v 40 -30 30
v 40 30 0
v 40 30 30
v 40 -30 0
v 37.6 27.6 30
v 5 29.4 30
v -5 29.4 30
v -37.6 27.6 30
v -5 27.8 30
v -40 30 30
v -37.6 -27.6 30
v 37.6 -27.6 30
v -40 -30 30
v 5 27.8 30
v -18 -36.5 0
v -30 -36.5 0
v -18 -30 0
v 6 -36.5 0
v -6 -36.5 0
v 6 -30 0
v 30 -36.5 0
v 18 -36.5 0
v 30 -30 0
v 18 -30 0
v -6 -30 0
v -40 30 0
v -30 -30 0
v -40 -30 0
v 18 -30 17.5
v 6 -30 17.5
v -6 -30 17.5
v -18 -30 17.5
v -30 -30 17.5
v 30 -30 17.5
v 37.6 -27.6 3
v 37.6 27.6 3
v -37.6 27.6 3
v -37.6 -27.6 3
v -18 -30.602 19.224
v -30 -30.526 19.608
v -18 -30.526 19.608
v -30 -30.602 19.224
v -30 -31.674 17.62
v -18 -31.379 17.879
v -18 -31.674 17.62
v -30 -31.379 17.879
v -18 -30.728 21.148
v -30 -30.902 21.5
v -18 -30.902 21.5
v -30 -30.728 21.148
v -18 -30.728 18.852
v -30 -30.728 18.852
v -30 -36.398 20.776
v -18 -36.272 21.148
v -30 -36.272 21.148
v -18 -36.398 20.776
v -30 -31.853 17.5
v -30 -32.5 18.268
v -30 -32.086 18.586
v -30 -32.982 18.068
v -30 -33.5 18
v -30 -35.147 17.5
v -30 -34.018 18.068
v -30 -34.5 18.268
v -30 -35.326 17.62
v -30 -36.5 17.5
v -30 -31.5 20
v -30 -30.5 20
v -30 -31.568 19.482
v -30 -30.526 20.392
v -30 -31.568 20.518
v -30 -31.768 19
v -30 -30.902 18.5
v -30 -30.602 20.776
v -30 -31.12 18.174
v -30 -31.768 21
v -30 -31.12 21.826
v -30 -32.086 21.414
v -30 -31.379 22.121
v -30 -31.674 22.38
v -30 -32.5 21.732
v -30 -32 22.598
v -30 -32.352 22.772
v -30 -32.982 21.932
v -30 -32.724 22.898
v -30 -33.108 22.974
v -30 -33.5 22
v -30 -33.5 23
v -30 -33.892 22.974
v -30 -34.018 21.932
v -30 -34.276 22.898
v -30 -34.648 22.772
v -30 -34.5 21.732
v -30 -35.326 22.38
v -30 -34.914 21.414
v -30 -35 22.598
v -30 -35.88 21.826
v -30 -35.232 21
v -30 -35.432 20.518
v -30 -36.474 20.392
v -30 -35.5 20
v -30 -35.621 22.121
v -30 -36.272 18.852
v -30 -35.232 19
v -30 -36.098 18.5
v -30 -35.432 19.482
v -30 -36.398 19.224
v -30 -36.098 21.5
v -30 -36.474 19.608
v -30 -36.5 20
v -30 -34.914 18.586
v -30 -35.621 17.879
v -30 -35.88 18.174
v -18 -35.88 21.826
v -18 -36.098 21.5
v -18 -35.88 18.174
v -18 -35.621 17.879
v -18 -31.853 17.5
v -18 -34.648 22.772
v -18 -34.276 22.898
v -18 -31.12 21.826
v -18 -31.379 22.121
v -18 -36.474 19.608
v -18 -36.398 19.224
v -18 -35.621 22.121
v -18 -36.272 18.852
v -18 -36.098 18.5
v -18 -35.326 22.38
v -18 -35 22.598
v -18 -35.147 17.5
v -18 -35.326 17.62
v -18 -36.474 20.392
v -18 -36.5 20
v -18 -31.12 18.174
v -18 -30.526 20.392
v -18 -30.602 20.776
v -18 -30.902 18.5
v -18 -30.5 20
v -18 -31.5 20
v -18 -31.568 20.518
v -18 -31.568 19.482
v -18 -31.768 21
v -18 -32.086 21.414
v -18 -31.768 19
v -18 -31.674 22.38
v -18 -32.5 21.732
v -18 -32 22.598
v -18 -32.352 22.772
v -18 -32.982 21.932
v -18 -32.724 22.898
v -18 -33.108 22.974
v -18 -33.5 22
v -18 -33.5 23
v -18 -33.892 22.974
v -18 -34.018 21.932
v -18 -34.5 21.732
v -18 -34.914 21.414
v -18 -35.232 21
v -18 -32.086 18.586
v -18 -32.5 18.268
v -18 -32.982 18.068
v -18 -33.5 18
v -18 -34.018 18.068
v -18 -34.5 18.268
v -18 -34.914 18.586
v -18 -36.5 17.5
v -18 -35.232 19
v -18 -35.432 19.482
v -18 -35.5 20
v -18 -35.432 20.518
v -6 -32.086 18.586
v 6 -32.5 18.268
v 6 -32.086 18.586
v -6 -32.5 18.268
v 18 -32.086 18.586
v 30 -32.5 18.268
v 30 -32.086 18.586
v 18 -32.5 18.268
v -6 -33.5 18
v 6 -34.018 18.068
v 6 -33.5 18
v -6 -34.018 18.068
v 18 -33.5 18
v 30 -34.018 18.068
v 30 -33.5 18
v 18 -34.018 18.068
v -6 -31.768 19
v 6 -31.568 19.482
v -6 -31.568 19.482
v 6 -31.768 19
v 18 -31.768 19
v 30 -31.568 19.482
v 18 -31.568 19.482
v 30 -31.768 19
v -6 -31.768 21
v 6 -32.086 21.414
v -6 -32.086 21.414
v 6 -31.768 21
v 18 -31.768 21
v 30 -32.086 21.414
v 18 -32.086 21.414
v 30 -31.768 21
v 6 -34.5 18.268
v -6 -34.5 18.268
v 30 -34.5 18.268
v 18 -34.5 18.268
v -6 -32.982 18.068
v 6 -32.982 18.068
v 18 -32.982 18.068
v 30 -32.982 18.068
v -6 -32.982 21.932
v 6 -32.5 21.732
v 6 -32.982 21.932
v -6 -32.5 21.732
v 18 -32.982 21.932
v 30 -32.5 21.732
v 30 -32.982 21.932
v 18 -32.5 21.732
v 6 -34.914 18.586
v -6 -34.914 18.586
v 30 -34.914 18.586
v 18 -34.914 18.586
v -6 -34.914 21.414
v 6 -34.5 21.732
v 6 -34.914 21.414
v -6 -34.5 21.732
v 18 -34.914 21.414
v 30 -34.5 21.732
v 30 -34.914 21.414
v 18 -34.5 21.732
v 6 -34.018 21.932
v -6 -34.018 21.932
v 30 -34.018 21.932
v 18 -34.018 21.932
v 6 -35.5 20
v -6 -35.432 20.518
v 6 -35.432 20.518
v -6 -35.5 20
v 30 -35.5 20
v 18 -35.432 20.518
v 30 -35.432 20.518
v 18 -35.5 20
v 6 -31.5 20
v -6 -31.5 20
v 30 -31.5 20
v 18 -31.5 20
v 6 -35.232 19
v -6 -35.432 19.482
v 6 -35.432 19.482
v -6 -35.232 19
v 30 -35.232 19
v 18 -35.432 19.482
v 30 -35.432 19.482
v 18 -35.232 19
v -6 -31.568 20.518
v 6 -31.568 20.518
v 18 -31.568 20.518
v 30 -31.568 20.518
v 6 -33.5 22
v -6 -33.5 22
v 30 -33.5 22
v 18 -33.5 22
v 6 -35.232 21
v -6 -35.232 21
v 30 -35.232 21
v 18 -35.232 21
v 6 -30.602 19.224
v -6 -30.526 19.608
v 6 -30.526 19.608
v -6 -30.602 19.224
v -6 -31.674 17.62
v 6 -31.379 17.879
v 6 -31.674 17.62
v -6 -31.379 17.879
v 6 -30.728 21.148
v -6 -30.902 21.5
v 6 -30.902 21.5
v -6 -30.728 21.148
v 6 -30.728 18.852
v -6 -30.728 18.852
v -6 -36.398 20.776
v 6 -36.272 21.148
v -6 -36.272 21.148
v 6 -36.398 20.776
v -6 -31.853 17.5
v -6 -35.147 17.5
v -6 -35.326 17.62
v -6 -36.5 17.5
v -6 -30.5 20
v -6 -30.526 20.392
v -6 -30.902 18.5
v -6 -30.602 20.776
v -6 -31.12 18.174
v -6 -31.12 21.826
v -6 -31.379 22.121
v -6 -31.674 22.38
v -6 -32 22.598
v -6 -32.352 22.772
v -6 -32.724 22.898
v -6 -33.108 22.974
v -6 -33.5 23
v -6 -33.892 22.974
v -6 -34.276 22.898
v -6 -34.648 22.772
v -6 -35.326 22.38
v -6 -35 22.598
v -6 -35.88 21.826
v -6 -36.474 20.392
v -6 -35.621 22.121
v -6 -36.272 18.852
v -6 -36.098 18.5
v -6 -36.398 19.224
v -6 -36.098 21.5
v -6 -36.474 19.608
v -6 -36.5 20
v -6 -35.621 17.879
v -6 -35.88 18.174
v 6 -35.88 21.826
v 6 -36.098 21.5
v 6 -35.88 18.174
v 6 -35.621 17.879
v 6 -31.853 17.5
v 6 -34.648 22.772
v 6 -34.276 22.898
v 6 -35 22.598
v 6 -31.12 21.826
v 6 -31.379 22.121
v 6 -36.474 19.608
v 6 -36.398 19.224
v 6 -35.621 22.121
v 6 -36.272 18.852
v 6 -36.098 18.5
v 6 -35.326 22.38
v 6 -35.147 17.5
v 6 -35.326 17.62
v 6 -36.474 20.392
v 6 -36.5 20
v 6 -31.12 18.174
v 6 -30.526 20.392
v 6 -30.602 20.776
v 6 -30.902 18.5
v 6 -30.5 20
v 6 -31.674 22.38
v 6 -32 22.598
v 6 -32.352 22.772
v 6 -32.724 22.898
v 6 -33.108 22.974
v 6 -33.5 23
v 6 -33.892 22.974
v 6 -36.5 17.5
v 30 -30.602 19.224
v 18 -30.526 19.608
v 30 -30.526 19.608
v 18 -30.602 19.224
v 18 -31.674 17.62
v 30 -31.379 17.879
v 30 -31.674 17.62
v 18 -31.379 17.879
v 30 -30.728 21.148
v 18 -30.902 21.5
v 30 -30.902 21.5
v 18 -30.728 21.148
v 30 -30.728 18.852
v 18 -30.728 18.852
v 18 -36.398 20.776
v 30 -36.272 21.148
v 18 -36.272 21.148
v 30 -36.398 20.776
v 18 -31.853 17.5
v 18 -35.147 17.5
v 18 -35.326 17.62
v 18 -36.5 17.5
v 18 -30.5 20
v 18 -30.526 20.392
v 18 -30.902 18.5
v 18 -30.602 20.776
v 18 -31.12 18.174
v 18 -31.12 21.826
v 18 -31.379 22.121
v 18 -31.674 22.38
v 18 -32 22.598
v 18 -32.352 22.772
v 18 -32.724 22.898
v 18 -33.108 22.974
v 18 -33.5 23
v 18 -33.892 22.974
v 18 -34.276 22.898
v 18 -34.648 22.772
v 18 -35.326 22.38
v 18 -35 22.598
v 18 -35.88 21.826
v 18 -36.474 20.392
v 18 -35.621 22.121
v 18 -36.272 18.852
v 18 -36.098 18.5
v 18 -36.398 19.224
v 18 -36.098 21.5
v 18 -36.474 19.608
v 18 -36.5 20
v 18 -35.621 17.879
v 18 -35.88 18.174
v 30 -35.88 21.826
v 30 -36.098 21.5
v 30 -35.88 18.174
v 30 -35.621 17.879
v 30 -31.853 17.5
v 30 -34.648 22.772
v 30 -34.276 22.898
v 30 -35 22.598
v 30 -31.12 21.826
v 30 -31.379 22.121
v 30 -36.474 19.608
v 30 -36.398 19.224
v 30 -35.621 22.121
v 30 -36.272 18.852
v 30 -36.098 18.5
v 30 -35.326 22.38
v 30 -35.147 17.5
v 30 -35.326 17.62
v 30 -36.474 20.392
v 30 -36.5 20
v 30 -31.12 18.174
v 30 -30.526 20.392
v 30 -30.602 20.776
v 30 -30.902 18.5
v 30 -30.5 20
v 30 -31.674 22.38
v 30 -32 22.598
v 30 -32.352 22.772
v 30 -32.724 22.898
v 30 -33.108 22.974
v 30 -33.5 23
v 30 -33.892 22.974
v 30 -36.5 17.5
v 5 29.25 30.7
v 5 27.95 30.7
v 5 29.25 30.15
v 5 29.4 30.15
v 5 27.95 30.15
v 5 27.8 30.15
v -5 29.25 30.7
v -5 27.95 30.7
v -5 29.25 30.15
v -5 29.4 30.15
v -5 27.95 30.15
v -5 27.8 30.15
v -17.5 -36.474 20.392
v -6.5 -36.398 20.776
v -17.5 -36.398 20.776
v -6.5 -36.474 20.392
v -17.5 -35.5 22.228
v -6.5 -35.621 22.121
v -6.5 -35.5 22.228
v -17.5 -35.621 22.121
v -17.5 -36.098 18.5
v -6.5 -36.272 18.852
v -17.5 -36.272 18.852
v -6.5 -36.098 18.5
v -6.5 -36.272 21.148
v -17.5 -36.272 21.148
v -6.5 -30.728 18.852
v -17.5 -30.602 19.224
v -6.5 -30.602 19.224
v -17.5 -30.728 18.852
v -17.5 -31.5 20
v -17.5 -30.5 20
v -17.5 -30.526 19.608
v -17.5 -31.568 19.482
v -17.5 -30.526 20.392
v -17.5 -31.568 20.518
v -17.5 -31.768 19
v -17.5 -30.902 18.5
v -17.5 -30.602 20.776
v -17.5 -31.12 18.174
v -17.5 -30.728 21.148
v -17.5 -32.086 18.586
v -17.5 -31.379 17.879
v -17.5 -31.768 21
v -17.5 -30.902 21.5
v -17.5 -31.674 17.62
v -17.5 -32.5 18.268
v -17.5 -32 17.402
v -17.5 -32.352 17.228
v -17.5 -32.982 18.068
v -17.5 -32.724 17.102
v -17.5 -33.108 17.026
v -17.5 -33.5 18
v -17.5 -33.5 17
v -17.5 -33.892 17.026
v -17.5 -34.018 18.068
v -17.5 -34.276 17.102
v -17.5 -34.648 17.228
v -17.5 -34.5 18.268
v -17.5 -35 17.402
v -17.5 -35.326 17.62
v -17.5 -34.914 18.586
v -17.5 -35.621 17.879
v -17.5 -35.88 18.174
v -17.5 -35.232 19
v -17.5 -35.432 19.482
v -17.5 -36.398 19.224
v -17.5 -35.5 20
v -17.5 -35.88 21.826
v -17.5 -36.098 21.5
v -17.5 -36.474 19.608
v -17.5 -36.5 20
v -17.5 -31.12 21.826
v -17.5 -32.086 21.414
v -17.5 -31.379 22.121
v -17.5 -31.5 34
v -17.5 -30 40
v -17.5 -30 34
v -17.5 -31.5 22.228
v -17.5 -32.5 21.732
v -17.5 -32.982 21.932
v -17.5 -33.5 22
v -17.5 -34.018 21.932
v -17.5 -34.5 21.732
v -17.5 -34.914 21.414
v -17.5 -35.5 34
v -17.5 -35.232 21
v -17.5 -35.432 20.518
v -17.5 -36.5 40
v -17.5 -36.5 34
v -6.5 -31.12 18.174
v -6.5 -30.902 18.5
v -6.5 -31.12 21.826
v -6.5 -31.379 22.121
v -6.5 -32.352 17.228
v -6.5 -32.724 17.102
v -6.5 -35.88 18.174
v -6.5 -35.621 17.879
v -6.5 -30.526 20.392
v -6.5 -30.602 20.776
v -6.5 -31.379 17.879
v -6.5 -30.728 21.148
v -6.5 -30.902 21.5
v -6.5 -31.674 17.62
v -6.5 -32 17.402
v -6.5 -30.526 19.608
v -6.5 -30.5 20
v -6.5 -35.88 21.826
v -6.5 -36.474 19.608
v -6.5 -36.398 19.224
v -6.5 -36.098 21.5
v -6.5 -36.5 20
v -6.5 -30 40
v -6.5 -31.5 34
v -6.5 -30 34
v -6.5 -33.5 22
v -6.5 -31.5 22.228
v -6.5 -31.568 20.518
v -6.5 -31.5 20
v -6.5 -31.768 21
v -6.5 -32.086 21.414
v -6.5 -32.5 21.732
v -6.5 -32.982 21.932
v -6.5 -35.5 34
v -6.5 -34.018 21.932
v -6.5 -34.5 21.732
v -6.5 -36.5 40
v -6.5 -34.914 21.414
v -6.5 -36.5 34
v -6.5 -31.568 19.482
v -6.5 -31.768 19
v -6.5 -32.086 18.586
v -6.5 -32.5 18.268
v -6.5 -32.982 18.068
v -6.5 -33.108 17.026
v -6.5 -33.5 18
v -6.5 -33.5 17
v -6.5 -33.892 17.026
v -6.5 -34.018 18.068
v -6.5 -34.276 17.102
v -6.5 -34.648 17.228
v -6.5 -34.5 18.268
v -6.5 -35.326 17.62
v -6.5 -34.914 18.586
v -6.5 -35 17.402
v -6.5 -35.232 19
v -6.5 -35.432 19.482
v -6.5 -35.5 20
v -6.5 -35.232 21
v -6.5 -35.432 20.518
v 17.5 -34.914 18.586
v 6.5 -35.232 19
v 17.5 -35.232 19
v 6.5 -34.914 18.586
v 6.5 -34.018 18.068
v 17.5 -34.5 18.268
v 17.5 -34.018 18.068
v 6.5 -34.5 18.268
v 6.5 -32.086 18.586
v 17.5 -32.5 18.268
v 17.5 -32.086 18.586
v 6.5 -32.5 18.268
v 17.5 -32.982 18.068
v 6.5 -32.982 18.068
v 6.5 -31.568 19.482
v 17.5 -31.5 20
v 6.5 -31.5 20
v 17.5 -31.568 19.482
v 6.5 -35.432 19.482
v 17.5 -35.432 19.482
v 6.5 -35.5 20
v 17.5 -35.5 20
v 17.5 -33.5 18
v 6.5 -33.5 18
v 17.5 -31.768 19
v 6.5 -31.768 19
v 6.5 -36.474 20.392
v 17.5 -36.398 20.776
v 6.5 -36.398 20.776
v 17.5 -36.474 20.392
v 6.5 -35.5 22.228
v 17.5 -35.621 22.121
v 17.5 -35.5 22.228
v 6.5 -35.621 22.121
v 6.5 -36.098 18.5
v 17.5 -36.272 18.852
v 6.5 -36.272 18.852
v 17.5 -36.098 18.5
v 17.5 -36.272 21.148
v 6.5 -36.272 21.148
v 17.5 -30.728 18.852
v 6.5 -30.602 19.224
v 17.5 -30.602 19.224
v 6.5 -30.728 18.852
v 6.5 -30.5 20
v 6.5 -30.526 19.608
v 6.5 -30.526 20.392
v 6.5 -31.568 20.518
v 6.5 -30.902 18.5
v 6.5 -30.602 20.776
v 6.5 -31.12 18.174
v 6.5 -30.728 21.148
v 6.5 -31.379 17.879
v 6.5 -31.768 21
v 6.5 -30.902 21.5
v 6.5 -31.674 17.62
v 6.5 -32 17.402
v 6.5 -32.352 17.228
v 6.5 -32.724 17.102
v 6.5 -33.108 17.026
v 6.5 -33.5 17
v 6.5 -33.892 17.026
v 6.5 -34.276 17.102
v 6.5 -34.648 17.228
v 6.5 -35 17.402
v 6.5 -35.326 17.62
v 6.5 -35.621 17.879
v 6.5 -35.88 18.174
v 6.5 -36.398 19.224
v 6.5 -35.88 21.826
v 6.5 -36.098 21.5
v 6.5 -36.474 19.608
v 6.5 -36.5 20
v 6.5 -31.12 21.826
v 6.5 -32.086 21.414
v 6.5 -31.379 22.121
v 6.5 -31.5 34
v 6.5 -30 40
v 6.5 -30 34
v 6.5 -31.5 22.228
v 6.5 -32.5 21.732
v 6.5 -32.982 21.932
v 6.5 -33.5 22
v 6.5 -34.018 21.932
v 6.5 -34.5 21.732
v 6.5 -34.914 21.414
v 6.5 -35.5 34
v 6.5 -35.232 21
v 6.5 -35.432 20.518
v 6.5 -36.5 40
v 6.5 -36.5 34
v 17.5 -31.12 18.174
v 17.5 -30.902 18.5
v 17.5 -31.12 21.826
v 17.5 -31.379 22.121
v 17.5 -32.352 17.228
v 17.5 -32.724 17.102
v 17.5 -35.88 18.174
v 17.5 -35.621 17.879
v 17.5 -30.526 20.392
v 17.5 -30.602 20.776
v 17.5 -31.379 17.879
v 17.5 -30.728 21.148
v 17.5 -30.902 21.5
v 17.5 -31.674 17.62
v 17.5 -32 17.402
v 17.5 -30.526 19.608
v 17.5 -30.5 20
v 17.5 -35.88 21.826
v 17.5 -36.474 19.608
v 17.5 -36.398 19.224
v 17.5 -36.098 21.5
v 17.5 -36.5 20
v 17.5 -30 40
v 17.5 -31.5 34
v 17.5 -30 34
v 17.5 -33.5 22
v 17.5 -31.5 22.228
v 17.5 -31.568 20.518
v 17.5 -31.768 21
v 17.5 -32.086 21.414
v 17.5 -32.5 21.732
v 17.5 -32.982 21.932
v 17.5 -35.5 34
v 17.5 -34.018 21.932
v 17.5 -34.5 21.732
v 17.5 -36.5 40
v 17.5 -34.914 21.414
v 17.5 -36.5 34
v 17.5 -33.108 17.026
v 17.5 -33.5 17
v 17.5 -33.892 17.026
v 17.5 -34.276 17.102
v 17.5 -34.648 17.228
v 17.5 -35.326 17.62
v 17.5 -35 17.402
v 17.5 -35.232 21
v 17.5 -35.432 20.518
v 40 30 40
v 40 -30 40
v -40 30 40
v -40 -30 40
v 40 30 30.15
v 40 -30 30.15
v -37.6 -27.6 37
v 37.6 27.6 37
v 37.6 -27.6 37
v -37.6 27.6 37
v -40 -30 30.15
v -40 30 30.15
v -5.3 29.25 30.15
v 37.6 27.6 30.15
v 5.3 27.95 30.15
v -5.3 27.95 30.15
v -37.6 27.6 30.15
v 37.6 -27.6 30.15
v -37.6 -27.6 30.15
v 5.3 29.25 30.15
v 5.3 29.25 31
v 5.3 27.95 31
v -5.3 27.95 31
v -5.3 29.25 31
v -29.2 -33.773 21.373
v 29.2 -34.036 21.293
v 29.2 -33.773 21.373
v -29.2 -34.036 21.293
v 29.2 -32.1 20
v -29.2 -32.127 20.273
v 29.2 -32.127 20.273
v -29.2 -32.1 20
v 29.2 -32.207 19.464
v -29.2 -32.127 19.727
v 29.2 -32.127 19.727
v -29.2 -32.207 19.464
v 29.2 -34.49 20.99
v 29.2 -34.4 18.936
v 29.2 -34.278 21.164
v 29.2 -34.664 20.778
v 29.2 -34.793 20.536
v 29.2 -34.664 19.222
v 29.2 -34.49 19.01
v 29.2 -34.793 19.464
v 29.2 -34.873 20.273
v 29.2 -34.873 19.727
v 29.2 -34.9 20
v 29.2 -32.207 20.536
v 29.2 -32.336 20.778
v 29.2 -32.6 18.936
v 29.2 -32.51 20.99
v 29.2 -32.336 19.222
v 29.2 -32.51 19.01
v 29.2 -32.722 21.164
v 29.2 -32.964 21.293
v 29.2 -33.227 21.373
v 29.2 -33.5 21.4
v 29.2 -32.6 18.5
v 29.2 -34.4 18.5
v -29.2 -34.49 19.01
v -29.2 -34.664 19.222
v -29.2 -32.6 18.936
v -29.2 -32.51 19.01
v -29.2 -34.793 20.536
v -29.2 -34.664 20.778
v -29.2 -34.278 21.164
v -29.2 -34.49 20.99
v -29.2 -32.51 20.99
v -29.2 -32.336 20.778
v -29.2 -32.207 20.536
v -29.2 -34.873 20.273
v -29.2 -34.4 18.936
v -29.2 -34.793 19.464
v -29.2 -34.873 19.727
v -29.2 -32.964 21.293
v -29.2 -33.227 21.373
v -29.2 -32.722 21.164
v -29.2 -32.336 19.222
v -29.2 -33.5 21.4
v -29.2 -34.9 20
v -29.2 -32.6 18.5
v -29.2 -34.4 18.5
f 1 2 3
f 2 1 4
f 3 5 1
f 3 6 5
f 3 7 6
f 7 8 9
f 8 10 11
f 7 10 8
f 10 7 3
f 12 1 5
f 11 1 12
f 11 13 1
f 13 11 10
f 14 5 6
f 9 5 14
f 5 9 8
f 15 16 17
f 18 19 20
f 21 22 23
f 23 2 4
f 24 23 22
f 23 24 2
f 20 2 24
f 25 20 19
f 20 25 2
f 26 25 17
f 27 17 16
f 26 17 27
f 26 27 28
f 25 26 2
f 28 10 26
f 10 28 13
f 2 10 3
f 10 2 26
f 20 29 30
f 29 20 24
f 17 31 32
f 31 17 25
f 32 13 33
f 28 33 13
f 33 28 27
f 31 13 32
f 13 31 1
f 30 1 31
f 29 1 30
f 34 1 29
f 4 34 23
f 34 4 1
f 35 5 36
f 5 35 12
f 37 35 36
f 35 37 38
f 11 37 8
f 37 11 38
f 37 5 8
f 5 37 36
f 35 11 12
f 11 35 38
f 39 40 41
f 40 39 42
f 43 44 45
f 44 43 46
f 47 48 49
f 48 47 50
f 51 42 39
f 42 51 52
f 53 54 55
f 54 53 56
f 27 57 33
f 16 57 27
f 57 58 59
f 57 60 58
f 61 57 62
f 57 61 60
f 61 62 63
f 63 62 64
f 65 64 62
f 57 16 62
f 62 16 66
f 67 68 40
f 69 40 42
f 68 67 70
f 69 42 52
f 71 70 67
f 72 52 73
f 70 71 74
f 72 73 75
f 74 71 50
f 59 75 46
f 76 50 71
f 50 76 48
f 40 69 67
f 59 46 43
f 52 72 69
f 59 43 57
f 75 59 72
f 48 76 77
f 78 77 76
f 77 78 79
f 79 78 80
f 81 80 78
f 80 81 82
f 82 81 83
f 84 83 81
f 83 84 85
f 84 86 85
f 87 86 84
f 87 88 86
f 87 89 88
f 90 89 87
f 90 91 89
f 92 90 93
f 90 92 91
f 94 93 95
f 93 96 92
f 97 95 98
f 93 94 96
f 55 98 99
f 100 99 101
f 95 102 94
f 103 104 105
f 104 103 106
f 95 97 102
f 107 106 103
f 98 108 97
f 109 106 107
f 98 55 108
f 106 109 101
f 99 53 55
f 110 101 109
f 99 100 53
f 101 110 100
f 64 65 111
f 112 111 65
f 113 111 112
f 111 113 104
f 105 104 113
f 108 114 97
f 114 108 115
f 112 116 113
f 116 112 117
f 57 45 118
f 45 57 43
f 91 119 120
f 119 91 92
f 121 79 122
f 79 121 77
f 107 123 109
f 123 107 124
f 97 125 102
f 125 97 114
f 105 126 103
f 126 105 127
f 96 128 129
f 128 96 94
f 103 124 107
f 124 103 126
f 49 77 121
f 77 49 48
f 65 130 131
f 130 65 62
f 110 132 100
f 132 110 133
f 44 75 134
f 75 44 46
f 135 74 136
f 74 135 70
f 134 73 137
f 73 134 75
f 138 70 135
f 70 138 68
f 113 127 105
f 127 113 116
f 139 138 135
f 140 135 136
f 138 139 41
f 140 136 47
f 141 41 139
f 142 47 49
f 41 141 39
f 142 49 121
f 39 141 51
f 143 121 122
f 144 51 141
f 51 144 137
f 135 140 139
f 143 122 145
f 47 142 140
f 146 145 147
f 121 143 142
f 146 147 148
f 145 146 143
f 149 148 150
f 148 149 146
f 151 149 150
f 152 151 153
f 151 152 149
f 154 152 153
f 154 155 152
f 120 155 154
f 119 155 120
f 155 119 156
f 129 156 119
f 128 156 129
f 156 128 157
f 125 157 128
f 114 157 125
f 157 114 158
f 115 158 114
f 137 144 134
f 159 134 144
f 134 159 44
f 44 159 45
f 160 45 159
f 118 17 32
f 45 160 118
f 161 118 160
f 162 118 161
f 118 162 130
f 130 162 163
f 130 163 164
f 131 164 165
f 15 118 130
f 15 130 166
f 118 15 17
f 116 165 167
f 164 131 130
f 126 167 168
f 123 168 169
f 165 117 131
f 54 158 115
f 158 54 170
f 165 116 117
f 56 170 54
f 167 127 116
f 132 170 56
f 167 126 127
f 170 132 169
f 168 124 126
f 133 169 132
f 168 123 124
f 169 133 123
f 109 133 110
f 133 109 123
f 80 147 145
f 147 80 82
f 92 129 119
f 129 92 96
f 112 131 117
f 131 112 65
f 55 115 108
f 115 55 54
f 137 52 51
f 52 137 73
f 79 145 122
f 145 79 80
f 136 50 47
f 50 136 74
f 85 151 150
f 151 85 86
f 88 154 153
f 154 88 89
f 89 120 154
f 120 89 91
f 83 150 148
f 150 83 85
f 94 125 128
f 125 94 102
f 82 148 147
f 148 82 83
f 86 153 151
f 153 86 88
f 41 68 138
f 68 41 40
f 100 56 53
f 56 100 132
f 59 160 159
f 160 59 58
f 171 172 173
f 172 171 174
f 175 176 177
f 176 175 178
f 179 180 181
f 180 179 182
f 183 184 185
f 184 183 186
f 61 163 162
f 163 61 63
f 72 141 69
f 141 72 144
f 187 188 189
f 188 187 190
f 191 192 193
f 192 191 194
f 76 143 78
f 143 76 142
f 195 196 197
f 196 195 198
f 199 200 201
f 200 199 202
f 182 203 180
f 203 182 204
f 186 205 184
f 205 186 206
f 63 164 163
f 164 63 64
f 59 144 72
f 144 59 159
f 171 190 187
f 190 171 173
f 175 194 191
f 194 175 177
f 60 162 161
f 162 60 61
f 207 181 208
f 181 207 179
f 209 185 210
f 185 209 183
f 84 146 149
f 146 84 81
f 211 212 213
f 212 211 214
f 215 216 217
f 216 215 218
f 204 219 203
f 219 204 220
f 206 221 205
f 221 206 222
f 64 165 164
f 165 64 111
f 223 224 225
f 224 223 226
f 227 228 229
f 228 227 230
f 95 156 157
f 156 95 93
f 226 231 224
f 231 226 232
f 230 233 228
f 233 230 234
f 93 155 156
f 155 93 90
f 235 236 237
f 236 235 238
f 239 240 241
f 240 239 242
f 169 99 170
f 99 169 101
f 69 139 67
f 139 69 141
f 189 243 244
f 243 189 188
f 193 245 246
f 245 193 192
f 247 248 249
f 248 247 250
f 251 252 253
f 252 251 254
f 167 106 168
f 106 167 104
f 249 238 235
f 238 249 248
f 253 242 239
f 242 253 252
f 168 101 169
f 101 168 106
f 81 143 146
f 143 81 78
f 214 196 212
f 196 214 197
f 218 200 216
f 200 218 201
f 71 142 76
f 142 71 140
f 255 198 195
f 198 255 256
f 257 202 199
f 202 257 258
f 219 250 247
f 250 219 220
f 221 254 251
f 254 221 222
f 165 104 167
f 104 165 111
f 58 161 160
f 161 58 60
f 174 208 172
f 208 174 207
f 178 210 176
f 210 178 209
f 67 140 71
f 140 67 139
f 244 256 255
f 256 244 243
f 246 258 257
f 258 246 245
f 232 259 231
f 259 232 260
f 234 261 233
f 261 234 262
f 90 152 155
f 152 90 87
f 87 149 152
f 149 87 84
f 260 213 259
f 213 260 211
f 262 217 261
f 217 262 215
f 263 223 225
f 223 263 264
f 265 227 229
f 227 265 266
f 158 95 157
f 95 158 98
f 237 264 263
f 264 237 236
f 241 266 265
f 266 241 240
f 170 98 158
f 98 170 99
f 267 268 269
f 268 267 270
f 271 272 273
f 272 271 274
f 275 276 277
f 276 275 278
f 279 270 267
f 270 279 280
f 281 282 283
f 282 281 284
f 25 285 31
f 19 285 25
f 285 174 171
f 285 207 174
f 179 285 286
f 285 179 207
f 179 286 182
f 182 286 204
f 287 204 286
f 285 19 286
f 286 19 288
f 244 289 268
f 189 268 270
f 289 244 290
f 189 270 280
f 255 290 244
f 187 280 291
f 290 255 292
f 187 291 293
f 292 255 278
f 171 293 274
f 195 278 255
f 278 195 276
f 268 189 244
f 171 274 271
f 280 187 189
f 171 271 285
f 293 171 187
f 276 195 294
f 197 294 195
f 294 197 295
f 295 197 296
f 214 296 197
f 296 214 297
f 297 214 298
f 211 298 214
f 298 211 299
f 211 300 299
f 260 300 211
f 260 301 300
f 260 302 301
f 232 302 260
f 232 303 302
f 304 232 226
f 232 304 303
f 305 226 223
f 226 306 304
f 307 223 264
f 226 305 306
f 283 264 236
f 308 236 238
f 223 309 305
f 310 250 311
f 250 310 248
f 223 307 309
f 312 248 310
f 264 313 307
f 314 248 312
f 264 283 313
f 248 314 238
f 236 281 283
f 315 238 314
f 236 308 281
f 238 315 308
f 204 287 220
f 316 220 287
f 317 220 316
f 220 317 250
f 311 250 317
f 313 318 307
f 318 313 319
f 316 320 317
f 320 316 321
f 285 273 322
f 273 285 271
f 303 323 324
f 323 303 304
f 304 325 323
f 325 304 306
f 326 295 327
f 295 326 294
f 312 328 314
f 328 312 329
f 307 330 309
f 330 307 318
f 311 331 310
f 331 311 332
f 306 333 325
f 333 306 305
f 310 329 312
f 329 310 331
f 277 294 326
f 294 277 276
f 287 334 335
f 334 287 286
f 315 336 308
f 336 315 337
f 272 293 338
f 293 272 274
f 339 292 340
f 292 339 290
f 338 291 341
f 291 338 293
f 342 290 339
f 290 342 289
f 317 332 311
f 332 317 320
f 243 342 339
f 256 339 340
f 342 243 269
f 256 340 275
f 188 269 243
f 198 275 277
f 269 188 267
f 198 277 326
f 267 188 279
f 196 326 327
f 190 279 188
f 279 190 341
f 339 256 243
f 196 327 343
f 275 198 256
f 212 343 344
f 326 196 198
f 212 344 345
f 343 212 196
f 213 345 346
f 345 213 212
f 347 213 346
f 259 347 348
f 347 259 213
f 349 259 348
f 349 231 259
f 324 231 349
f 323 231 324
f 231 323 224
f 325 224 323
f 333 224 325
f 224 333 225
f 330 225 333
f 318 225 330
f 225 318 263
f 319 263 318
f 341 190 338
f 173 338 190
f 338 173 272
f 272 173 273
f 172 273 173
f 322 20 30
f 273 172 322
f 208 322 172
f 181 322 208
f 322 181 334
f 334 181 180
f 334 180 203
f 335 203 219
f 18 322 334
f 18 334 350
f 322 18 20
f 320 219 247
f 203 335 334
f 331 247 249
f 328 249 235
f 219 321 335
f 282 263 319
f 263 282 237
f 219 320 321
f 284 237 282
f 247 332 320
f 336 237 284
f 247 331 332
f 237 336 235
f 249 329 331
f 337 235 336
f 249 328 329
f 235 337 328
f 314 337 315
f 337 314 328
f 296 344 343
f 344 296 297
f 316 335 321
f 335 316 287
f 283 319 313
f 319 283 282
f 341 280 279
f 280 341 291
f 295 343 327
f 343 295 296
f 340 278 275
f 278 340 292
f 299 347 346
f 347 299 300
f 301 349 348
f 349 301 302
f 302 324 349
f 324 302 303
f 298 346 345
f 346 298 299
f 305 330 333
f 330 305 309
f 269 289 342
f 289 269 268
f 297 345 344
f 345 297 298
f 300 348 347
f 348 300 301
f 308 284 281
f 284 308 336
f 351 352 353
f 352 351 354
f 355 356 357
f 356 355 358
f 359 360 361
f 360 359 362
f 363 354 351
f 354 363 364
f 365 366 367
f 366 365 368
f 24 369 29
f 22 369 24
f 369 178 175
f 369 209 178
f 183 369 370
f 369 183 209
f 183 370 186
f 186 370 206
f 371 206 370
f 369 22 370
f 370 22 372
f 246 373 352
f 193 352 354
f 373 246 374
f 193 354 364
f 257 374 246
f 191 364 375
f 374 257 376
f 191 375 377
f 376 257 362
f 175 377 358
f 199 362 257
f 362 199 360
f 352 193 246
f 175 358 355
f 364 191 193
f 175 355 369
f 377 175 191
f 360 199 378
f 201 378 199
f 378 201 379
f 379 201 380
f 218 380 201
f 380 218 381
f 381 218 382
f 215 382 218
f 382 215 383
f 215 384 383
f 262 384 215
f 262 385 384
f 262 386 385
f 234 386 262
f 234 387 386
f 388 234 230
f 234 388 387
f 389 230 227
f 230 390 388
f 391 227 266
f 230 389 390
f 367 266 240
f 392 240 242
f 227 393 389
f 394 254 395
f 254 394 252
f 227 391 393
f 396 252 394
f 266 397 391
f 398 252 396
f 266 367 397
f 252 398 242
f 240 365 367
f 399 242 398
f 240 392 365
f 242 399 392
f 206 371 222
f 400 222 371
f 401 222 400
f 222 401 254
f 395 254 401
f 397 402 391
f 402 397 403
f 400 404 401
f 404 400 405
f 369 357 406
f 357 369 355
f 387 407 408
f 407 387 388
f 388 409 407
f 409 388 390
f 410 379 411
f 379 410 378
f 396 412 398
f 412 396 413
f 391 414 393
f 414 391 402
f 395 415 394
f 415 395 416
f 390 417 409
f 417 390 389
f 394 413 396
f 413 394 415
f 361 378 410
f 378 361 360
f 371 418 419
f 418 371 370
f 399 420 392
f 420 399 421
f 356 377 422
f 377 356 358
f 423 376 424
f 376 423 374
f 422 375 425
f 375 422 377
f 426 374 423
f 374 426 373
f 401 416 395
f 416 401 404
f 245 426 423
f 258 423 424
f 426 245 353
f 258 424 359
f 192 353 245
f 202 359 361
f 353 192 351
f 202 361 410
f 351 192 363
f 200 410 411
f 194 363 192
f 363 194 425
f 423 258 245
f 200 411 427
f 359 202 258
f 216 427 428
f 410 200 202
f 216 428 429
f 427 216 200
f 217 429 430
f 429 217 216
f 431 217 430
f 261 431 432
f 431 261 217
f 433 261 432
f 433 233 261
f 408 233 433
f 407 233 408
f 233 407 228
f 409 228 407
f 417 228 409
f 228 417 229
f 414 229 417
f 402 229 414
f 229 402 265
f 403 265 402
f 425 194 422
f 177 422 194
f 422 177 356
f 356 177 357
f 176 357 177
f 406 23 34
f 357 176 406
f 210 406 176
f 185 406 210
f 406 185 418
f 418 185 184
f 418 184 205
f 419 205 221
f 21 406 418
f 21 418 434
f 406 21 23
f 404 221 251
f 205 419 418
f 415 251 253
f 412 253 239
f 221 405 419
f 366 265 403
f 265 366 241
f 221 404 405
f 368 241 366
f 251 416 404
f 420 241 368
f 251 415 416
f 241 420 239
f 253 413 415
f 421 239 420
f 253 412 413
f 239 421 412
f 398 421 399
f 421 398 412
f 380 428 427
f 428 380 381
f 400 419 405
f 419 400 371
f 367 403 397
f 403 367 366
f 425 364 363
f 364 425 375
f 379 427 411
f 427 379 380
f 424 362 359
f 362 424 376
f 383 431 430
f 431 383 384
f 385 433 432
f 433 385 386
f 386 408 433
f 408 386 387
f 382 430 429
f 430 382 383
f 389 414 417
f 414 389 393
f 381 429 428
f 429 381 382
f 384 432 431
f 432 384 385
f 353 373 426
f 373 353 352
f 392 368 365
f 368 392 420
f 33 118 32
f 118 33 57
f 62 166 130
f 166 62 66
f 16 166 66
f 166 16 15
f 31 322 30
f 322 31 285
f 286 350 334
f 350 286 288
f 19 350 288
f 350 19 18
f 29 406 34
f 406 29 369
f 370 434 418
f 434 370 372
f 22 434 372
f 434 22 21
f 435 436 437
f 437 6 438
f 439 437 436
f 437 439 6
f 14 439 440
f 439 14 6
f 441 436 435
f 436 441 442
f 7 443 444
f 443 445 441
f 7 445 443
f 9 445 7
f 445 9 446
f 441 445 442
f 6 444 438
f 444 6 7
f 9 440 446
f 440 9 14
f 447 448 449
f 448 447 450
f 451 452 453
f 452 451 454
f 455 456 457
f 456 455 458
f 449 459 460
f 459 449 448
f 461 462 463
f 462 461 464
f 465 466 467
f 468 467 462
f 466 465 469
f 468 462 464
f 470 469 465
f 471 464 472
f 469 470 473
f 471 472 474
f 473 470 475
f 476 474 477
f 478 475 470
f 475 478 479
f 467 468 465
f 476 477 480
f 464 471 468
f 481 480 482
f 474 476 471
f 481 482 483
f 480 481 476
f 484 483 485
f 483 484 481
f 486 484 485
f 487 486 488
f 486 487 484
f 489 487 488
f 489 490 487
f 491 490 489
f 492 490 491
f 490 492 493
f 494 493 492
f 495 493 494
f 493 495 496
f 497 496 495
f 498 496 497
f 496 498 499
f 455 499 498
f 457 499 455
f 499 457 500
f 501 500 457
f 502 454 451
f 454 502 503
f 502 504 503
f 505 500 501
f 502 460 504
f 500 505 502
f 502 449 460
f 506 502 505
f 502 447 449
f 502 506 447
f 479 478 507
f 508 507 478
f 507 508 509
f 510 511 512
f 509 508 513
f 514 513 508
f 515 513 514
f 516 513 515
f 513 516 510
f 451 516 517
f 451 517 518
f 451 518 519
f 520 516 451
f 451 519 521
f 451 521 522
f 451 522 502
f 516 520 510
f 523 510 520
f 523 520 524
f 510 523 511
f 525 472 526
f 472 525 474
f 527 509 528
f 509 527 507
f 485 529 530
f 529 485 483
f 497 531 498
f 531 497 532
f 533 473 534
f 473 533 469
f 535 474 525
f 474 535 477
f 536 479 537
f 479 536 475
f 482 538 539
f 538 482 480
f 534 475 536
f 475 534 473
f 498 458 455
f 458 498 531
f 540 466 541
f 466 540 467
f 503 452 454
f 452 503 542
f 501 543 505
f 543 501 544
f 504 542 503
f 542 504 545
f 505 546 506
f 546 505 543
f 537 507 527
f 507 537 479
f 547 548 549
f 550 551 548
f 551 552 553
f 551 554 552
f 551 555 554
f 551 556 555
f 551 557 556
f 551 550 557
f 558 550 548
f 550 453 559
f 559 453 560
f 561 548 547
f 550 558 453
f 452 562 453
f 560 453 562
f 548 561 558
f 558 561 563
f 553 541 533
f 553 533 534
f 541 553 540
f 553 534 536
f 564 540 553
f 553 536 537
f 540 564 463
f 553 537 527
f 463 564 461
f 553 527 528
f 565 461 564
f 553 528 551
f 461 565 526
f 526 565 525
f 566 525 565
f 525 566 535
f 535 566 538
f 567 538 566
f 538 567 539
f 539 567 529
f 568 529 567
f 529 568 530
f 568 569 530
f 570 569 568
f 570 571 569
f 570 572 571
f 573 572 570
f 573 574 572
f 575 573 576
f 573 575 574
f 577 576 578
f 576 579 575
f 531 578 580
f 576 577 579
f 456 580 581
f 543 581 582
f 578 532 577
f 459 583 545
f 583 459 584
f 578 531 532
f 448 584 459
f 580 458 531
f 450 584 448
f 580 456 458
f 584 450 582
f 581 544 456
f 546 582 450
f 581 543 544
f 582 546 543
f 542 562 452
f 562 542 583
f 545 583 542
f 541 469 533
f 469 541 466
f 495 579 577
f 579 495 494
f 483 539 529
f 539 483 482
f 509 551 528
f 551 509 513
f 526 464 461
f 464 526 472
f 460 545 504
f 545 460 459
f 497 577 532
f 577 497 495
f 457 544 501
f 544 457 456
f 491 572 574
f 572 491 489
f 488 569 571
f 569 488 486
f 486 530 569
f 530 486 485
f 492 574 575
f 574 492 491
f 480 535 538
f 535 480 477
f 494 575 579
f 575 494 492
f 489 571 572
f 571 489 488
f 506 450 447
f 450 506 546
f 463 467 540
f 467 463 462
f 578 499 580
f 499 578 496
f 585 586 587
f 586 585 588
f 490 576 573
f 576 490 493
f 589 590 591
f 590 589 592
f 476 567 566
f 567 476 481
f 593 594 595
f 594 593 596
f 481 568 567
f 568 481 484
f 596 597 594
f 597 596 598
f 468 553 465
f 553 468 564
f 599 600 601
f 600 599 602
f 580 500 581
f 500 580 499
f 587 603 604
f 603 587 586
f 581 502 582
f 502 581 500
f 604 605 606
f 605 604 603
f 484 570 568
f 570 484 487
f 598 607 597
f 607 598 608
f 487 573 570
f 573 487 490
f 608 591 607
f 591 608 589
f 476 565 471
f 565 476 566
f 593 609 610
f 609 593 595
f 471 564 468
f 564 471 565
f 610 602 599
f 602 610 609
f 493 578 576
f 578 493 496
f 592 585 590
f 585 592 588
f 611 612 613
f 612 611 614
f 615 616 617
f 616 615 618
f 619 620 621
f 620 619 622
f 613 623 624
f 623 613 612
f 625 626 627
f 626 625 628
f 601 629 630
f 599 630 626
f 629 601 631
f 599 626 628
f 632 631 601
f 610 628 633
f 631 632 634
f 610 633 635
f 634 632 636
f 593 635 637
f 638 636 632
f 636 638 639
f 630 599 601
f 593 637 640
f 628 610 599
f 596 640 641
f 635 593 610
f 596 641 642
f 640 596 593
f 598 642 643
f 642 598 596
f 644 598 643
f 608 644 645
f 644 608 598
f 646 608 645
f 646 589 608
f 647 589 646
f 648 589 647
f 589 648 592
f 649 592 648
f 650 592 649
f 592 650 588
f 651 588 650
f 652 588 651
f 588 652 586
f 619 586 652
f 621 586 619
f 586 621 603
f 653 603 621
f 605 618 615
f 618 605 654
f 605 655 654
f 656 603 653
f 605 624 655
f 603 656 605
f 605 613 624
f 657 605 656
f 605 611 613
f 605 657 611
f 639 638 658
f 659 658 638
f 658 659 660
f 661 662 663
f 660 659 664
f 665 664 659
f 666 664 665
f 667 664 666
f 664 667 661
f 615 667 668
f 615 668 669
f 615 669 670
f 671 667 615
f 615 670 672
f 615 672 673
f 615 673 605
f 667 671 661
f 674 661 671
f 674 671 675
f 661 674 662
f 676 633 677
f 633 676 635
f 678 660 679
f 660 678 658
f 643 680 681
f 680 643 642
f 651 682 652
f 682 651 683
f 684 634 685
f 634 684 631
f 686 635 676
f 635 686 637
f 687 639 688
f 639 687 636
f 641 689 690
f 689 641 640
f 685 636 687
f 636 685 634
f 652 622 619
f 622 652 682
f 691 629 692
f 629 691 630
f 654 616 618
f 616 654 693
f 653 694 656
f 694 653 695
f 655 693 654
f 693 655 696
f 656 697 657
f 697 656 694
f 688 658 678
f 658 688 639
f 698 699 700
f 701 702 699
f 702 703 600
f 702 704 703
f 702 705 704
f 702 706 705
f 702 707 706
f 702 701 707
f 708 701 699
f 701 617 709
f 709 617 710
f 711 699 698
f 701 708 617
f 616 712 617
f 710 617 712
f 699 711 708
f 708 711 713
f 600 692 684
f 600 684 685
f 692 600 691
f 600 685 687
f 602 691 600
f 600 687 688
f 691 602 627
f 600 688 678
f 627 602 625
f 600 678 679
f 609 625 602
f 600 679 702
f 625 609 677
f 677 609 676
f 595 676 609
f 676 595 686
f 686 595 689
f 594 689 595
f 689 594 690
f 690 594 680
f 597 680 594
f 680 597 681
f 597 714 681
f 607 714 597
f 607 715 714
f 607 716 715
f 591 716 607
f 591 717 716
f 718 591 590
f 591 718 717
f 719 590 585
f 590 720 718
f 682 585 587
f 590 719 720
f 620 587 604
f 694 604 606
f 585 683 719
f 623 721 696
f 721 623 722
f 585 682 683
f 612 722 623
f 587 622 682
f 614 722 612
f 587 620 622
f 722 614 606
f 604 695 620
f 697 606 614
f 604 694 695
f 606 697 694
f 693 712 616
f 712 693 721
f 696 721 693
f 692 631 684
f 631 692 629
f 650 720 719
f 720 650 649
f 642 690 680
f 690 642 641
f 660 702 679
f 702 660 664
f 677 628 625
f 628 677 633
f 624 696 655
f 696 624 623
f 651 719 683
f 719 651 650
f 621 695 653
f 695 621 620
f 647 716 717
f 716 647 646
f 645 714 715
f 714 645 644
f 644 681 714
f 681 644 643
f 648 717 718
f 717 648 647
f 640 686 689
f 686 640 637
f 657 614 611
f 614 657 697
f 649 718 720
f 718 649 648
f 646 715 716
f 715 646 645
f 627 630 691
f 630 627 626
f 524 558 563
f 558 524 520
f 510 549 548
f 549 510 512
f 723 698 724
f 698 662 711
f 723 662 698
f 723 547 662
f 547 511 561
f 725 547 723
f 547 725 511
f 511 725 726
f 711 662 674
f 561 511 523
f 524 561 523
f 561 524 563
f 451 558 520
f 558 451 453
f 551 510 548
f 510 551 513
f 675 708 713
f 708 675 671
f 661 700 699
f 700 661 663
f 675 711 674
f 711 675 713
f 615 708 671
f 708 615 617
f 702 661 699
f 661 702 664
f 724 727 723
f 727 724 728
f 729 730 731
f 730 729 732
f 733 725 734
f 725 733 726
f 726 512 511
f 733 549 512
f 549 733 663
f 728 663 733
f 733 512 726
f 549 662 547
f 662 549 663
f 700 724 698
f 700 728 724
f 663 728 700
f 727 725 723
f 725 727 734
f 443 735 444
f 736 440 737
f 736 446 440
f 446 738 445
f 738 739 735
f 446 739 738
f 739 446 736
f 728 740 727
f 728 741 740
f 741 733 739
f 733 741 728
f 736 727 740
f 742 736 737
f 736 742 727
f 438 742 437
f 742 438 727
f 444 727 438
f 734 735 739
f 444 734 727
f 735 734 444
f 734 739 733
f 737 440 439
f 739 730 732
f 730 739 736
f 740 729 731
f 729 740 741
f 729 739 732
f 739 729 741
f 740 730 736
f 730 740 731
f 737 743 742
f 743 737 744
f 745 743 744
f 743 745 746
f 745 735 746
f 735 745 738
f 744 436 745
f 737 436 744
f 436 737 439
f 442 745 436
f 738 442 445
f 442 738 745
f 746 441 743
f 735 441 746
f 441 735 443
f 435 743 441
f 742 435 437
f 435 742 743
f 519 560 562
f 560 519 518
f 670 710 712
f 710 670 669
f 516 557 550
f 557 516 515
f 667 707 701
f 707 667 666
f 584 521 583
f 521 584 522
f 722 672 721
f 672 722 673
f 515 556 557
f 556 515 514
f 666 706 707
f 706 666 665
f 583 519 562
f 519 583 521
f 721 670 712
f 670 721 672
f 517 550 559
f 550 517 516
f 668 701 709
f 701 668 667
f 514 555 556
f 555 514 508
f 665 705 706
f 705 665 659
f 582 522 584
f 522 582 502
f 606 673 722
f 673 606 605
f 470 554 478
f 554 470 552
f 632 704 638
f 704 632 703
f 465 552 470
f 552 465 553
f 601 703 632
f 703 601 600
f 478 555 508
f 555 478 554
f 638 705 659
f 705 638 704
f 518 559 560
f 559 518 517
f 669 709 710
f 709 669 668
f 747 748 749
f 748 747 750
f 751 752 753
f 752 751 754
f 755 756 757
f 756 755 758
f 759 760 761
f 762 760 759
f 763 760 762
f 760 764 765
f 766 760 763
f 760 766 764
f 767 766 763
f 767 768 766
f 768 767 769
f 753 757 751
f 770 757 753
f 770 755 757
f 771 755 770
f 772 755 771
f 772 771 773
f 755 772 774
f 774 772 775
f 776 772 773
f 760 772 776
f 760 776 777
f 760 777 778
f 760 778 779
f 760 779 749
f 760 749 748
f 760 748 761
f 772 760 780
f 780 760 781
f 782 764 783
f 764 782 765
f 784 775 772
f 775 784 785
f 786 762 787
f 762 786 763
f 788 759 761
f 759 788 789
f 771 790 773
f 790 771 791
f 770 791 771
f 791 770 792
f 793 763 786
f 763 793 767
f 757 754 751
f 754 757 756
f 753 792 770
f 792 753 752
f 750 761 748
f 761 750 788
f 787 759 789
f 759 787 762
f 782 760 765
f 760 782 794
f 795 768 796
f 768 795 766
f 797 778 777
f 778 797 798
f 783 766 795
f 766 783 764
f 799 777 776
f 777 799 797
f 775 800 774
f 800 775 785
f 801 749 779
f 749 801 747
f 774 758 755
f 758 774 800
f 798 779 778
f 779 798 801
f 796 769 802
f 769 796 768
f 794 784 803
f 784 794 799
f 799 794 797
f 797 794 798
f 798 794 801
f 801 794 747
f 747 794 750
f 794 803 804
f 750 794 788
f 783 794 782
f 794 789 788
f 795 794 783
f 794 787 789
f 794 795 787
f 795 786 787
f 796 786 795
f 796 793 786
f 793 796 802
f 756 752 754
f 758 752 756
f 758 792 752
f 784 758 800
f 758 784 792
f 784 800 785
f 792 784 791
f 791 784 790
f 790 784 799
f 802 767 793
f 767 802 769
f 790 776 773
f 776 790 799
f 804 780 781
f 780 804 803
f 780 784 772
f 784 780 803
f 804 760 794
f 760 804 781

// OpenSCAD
part = "assembly"; // [base, lid, pin, assembly]
cadverify_only = "";
module instance(name, part, unit = 1) {
  echo(cadverify_instance = [name, part, unit]);
  if (cadverify_only == "" || cadverify_only == name) children();
}
Ya = -33.5; Za = 20; Kr = 3.0; Br = 2.0; Pr = 1.4;
BX = [[-30,-18],[-6,6],[18,30]];
LX = [[-17.5,-6.5],[6.5,17.5]];
module barrelX(x0, x1) {
  difference() {
    translate([0,Ya,Za]) rotate([0,90,0]) translate([0,0,(x0+x1)/2])
      cylinder(h=x1-x0, r=Kr, center=true, $fn=48);
    translate([0,Ya,Za]) rotate([0,90,0]) translate([0,0,(x0+x1)/2])
      cylinder(h=(x1-x0)+1.0, r=Br, center=true, $fn=24);
  }
}
module base_geom() {
  difference() {
    union() {
      difference() {
        translate([-40,-30,0]) cube([80,60,30]);
        translate([-37.6,-27.6,3]) cube([75.2,55.2,27.01]);
      }
      for (b=BX) {
        translate([b[0],-36.5,0]) cube([b[1]-b[0],6.5,17.5]);
        barrelX(b[0], b[1]);
      }
      translate([-5,27.8,30]) cube([10,1.6,0.7]);
    }
    translate([0,Ya,Za]) rotate([0,90,0]) translate([0,0,0])
      cylinder(h=62, r=Br, center=true, $fn=24);
  }
}
module lid_open() {
  difference() {
    union() {
      translate([-40,-97,0]) cube([80,60,3]);
      translate([-40,-97,3]) cube([80,2.4,6.85]);
      translate([-40,-39.4,3]) cube([80,2.4,6.85]);
      translate([-40,-97,3]) cube([2.4,60,6.85]);
      translate([37.6,-97,3]) cube([2.4,60,6.85]);
      for (b=LX) {
        translate([b[0],-39,0]) cube([b[1]-b[0],8.5,6]);
        translate([b[0],-35.5,3]) cube([b[1]-b[0],4,17.5]);
        barrelX(b[0], b[1]);
      }
    }
    translate([-5.3,-96.25,9.0]) cube([10.6,1.3,1.1]);
    translate([0,Ya,Za]) rotate([0,90,0]) translate([0,0,0])
      cylinder(h=62, r=Br, center=true, $fn=24);
  }
}
module pin_geom() {
  union() {
    translate([-29.2,0,1.5]) rotate([0,90,0])
      cylinder(h=58.4, r=Pr, center=false, $fn=32);
    translate([-29.2,-0.9,0]) cube([58.4,1.8,0.5]);
  }
}
module lid_closed() {
  translate([0,Ya,Za]) rotate([180,0,0]) translate([0,-Ya,-Za]) lid_open();
}
module pin_placed() {
  translate([0,Ya,Za-1.5]) pin_geom();
}
if (part=="base") {
  base_geom();
  echo(cadverify_spec=[
    ["bounds", [[-40,-36.5,0],[40,30,30.7]]],
    ["bodies", 1],
    ["support_faces", [["base","-z",4000]]],
    ["overhangs_allowed", [["hinge", [[-30,-37,16],[30,-30,24]]]]],
    ["copies", 1],
    ["details", [
      ["bottom","thickness",[0,0,-1],[0,0,1],3],
      ["cavity","void",[[-37.6,-27.6,3],[37.6,27.6,30]],0.9],
      ["knuckle","material",[[-30,-36.5,17],[-18,-30.5,23]],0.4],
      ["bore","hole",[-31,-33.5,20],[1,0,0],[[0,4.0],[10,4.0]]],
      ["catch","material",[[-5,27.8,30],[5,29.4,30.7]],0.6]
    ]]
  ]);
} else if (part=="lid") {
  lid_open();
  echo(cadverify_spec=[
    ["bounds", [[-40,-97,0],[40,-30.5,23]]],
    ["bodies", 1],
    ["support_faces", [["lid","-z",4000]]],
    ["overhangs_allowed", [["hinge", [[-30,-37,16],[30,-30,24]]]]],
    ["copies", 1],
    ["details", [
      ["plate","thickness",[0,-67,-1],[0,0,1],3],
      ["pocket","void",[[-37.6,-94.6,3],[37.6,-39.4,9.85]],0.9],
      ["knuckle","material",[[-17.5,-36.5,17],[-6.5,-30.5,23]],0.4],
      ["bore","hole",[-18,-33.5,20],[1,0,0],[[0,4.0],[9,4.0]]],
      ["notch","void",[[-5.3,-96.25,9.0],[5.3,-94.95,10.1]],0.9]
    ]]
  ]);
} else if (part=="pin") {
  pin_geom();
  echo(cadverify_spec=[
    ["bounds", [[-29.2,-1.4,0],[29.2,1.4,2.9]]],
    ["bodies", 1],
    ["support_faces", [["pin","-z",50]]],
    ["overhangs_allowed", [["pinFlankA", [[-29.3,-1.1,0.2],[29.3,-0.8,0.6]]],["pinFlankB", [[-29.3,0.8,0.2],[29.3,1.1,0.6]]]]],
    ["copies", 1],
    ["details", [
      ["shaft","thickness",[0,5,1.5],[0,-1,0],2.8],
      ["fin","thickness",[0,0,-1],[0,0,1],0.5]
    ]]
  ]);
} else {
  instance("base","base") base_geom();
  instance("lid","lid") lid_closed();
  instance("pin","pin") pin_placed();
  echo(cadverify_spec=[
    ["bounds", [[-40,-36.5,0],[40,30,40]]],
    ["support_faces", [["bed","-z",4000]]],
    ["allowed_interferences", [["base","lid","catch press"]]],
    ["motions", [["swing",["lid"],"rotate",[0,-33.5,20],[1,0,0],[0,180],["flex",[["lid","base",0.5,"catch entry"]]]]]],
    ["assembly_order", [[["base"],[0,0,0]],[["lid"],[0,0,1]],[["pin"],[-1,0,0]]]],
    ["print_in_place", 0.4],
    ["print_pose", [["swing",180]]],
    ["overhangs_allowed", [["hinge", [[-30,-37,16],[30,-30,24]]]]]
  ]);
}
